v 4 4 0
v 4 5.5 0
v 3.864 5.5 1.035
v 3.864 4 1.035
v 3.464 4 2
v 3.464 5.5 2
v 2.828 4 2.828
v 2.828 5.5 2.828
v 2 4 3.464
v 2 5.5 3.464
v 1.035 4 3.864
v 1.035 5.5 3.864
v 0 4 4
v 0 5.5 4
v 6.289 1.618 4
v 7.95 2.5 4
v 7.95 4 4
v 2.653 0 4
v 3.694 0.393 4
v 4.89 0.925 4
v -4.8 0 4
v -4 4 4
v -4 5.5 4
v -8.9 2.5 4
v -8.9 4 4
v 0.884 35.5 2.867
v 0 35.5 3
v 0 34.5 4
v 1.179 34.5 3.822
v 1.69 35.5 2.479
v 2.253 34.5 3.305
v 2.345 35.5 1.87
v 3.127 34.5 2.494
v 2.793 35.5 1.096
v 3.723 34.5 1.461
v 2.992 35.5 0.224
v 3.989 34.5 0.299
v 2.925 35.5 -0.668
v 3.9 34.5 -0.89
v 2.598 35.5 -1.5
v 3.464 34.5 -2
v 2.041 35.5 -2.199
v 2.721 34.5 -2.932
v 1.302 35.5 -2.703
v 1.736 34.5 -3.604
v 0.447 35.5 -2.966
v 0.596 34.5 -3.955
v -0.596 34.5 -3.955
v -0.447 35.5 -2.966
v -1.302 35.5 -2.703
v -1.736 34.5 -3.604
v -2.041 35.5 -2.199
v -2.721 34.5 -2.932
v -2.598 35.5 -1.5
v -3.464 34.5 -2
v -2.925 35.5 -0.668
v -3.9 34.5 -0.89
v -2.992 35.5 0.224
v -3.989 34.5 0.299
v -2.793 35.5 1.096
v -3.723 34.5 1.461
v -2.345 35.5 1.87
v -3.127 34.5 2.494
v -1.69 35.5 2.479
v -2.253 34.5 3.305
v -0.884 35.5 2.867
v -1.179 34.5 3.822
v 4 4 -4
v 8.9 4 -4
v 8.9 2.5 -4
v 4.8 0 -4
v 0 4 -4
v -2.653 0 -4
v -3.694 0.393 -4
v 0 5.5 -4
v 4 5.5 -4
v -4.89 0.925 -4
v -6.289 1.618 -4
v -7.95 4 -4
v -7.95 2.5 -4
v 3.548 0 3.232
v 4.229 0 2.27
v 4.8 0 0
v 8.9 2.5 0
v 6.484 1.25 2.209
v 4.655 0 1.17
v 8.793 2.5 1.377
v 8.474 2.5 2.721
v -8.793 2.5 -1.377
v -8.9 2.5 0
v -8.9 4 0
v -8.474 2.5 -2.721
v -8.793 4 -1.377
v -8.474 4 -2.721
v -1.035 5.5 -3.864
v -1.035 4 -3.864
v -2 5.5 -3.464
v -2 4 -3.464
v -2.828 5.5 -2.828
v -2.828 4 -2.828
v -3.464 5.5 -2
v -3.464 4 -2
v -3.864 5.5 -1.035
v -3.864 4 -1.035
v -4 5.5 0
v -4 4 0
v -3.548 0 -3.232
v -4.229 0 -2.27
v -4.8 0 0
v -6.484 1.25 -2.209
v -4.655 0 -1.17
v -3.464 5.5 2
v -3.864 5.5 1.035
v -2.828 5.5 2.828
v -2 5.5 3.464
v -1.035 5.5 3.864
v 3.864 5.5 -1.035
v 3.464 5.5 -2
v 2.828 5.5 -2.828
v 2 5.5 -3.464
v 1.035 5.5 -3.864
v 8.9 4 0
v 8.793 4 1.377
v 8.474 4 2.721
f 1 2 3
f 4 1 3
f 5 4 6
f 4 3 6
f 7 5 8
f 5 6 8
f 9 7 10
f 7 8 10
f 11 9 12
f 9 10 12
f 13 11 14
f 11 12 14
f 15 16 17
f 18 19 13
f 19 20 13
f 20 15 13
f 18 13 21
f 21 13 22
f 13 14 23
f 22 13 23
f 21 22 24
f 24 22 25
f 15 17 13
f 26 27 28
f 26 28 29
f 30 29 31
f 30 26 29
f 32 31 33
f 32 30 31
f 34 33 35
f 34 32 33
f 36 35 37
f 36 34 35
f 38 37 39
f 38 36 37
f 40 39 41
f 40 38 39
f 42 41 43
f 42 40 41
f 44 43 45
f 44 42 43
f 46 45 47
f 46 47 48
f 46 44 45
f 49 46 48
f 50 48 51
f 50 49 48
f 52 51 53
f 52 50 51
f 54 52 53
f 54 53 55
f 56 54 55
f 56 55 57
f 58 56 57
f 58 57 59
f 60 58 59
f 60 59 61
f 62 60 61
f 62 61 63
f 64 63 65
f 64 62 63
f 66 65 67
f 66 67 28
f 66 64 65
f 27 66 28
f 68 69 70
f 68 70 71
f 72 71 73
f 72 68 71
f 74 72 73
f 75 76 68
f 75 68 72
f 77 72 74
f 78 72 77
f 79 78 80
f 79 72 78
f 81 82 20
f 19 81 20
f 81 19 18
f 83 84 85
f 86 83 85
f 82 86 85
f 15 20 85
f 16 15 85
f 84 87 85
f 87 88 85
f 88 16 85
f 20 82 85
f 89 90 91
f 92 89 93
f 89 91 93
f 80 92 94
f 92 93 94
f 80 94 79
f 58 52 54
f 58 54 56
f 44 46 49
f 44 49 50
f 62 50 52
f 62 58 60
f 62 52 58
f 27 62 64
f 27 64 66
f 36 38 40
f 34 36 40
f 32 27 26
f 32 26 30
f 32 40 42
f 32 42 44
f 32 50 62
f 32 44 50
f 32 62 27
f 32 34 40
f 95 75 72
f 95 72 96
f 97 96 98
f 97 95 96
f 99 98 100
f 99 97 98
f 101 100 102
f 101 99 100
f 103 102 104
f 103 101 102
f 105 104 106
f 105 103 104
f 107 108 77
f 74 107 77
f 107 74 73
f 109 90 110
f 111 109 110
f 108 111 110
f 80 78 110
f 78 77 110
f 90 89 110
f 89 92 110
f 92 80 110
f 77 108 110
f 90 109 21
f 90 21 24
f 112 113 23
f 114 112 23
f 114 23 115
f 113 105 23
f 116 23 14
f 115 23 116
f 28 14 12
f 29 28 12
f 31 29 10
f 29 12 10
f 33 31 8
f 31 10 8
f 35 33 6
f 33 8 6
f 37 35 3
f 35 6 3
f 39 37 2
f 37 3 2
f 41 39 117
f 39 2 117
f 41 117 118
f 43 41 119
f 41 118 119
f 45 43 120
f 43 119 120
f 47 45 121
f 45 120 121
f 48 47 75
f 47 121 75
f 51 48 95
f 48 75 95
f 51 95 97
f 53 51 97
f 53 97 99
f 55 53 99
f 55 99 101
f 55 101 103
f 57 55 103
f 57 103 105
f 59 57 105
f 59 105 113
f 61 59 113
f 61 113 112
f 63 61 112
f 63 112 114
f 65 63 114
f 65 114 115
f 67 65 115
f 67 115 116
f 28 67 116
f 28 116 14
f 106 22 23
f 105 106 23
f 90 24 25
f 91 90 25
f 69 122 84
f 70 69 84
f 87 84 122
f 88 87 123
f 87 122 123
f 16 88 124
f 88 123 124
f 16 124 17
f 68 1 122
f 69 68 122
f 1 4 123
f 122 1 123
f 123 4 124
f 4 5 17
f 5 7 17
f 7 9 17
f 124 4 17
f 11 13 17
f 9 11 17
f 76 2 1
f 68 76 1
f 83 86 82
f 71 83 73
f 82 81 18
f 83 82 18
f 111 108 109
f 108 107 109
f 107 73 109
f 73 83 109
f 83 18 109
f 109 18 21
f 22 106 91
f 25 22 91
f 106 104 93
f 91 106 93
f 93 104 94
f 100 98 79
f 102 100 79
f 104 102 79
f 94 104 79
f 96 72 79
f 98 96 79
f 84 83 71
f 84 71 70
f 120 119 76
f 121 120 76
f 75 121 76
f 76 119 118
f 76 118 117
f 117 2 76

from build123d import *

# Parameters (mm, degrees)
EXTRUDE_1_DEPTH     = 4
CUT_EXTRUDE_1_DEPTH = 1.5
SKETCH_2_R          = 4
EXTRUDE_2_DEPTH     = 30
CUT_EXTRUDE_2_DEPTH = 5
CHAMFER_2_SIZE      = 1


with BuildPart() as part:
    # Эскиз1 → Бобышка-Вытянуть1 (new body, symmetric)
    with BuildSketch(Plane.XY):
        Polygon((8.9, 0), (-8.9, 0), (-8.9, 4), (-4, 4), (-4, 5.5), (4, 5.5), (4, 4), (8.9, 4), align=None)
    extrude(amount=EXTRUDE_1_DEPTH, both=True)

    # Эскиз3 → Вырез-Вытянуть1 (cut)
    with BuildSketch(Plane(origin=(0, 5.5, 0), x_dir=(1, 0, 0), z_dir=(0, 1, 0))):
        with BuildLine():
            Line((-4, 0), (-4, 4))
            Line((-4, 4), (0, 4))
            ThreePointArc((0, 4), (-2.828427125, 2.828427125), (-4, 0))
        make_face()
        with BuildLine():
            Line((0, -4), (4, -4))
            Line((4, -4), (4, 0))
            ThreePointArc((4, 0), (2.828427125, -2.828427125), (0, -4))
        make_face()
    extrude(amount=-CUT_EXTRUDE_1_DEPTH, mode=Mode.SUBTRACT)

    # Эскиз2 → Бобышка-Вытянуть2 (add)
    with BuildSketch(Plane(origin=(0, 5.5, 0), x_dir=(1, 0, 0), z_dir=(0, 1, 0))):
        with Locations(Location((0, 0, 0), (0, 0, 270))):  # turned: the seam where the file's is
            Circle(SKETCH_2_R)
    extrude(amount=EXTRUDE_2_DEPTH)

    # Эскиз4 → Вырез-Вытянуть2 (cut, through all)
    with BuildSketch(Plane(origin=(0, 4, 0), x_dir=(1, 0, 0), z_dir=(0, 1, 0))):
        with BuildLine():
            Line((-7.950471684, 4), (-8.9, 4))
            Line((-8.9, 4), (-8.9, 0))
            ThreePointArc((-8.9, 0), (-8.659364815, 2.055578022), (-7.950471684, 4))
        make_face()
        with BuildLine():
            Line((7.950471684, -4), (8.9, -4))
            Line((8.9, -4), (8.9, 0))
            ThreePointArc((8.9, 0), (8.659364815, -2.055578022), (7.950471684, -4))
        make_face()
    extrude(amount=-CUT_EXTRUDE_2_DEPTH, mode=Mode.SUBTRACT)

    # Вырез-По траектории1: sweep along a path in Эскиз6
    with BuildLine(Plane.XZ) as sweep_1_path:
        Line((0, -8.9), (8.9, -8.9))
        Line((8.9, -8.9), (8.9, 0))
        ThreePointArc((8.9, 0), (6.293250353, 6.293250353), (0, 8.9))
        Line((0, 8.9), (-8.9, 8.9))
        Line((-8.9, 8.9), (-8.9, 0))
        ThreePointArc((-8.9, 0), (-6.293250353, -6.293250353), (0, -8.9))
    # Эскиз5 → Вырез-По траектории1 (sweep, cut)
    with BuildSketch(Plane.XY.offset(4)):
        Polygon((-8.9, 2.5), (-4.8, 0), (-8.9, 0), align=None)
    sweep(path=sweep_1_path.line, transition=Transition.RIGHT, mode=Mode.SUBTRACT)

    # Фаска2
    chamfer_2_edges = [part.edges().sort_by_distance(p)[0] for p in [
        (0, 35.5, -4),
    ]]
    chamfer(chamfer_2_edges, length=CHAMFER_2_SIZE)


solid = part.part
